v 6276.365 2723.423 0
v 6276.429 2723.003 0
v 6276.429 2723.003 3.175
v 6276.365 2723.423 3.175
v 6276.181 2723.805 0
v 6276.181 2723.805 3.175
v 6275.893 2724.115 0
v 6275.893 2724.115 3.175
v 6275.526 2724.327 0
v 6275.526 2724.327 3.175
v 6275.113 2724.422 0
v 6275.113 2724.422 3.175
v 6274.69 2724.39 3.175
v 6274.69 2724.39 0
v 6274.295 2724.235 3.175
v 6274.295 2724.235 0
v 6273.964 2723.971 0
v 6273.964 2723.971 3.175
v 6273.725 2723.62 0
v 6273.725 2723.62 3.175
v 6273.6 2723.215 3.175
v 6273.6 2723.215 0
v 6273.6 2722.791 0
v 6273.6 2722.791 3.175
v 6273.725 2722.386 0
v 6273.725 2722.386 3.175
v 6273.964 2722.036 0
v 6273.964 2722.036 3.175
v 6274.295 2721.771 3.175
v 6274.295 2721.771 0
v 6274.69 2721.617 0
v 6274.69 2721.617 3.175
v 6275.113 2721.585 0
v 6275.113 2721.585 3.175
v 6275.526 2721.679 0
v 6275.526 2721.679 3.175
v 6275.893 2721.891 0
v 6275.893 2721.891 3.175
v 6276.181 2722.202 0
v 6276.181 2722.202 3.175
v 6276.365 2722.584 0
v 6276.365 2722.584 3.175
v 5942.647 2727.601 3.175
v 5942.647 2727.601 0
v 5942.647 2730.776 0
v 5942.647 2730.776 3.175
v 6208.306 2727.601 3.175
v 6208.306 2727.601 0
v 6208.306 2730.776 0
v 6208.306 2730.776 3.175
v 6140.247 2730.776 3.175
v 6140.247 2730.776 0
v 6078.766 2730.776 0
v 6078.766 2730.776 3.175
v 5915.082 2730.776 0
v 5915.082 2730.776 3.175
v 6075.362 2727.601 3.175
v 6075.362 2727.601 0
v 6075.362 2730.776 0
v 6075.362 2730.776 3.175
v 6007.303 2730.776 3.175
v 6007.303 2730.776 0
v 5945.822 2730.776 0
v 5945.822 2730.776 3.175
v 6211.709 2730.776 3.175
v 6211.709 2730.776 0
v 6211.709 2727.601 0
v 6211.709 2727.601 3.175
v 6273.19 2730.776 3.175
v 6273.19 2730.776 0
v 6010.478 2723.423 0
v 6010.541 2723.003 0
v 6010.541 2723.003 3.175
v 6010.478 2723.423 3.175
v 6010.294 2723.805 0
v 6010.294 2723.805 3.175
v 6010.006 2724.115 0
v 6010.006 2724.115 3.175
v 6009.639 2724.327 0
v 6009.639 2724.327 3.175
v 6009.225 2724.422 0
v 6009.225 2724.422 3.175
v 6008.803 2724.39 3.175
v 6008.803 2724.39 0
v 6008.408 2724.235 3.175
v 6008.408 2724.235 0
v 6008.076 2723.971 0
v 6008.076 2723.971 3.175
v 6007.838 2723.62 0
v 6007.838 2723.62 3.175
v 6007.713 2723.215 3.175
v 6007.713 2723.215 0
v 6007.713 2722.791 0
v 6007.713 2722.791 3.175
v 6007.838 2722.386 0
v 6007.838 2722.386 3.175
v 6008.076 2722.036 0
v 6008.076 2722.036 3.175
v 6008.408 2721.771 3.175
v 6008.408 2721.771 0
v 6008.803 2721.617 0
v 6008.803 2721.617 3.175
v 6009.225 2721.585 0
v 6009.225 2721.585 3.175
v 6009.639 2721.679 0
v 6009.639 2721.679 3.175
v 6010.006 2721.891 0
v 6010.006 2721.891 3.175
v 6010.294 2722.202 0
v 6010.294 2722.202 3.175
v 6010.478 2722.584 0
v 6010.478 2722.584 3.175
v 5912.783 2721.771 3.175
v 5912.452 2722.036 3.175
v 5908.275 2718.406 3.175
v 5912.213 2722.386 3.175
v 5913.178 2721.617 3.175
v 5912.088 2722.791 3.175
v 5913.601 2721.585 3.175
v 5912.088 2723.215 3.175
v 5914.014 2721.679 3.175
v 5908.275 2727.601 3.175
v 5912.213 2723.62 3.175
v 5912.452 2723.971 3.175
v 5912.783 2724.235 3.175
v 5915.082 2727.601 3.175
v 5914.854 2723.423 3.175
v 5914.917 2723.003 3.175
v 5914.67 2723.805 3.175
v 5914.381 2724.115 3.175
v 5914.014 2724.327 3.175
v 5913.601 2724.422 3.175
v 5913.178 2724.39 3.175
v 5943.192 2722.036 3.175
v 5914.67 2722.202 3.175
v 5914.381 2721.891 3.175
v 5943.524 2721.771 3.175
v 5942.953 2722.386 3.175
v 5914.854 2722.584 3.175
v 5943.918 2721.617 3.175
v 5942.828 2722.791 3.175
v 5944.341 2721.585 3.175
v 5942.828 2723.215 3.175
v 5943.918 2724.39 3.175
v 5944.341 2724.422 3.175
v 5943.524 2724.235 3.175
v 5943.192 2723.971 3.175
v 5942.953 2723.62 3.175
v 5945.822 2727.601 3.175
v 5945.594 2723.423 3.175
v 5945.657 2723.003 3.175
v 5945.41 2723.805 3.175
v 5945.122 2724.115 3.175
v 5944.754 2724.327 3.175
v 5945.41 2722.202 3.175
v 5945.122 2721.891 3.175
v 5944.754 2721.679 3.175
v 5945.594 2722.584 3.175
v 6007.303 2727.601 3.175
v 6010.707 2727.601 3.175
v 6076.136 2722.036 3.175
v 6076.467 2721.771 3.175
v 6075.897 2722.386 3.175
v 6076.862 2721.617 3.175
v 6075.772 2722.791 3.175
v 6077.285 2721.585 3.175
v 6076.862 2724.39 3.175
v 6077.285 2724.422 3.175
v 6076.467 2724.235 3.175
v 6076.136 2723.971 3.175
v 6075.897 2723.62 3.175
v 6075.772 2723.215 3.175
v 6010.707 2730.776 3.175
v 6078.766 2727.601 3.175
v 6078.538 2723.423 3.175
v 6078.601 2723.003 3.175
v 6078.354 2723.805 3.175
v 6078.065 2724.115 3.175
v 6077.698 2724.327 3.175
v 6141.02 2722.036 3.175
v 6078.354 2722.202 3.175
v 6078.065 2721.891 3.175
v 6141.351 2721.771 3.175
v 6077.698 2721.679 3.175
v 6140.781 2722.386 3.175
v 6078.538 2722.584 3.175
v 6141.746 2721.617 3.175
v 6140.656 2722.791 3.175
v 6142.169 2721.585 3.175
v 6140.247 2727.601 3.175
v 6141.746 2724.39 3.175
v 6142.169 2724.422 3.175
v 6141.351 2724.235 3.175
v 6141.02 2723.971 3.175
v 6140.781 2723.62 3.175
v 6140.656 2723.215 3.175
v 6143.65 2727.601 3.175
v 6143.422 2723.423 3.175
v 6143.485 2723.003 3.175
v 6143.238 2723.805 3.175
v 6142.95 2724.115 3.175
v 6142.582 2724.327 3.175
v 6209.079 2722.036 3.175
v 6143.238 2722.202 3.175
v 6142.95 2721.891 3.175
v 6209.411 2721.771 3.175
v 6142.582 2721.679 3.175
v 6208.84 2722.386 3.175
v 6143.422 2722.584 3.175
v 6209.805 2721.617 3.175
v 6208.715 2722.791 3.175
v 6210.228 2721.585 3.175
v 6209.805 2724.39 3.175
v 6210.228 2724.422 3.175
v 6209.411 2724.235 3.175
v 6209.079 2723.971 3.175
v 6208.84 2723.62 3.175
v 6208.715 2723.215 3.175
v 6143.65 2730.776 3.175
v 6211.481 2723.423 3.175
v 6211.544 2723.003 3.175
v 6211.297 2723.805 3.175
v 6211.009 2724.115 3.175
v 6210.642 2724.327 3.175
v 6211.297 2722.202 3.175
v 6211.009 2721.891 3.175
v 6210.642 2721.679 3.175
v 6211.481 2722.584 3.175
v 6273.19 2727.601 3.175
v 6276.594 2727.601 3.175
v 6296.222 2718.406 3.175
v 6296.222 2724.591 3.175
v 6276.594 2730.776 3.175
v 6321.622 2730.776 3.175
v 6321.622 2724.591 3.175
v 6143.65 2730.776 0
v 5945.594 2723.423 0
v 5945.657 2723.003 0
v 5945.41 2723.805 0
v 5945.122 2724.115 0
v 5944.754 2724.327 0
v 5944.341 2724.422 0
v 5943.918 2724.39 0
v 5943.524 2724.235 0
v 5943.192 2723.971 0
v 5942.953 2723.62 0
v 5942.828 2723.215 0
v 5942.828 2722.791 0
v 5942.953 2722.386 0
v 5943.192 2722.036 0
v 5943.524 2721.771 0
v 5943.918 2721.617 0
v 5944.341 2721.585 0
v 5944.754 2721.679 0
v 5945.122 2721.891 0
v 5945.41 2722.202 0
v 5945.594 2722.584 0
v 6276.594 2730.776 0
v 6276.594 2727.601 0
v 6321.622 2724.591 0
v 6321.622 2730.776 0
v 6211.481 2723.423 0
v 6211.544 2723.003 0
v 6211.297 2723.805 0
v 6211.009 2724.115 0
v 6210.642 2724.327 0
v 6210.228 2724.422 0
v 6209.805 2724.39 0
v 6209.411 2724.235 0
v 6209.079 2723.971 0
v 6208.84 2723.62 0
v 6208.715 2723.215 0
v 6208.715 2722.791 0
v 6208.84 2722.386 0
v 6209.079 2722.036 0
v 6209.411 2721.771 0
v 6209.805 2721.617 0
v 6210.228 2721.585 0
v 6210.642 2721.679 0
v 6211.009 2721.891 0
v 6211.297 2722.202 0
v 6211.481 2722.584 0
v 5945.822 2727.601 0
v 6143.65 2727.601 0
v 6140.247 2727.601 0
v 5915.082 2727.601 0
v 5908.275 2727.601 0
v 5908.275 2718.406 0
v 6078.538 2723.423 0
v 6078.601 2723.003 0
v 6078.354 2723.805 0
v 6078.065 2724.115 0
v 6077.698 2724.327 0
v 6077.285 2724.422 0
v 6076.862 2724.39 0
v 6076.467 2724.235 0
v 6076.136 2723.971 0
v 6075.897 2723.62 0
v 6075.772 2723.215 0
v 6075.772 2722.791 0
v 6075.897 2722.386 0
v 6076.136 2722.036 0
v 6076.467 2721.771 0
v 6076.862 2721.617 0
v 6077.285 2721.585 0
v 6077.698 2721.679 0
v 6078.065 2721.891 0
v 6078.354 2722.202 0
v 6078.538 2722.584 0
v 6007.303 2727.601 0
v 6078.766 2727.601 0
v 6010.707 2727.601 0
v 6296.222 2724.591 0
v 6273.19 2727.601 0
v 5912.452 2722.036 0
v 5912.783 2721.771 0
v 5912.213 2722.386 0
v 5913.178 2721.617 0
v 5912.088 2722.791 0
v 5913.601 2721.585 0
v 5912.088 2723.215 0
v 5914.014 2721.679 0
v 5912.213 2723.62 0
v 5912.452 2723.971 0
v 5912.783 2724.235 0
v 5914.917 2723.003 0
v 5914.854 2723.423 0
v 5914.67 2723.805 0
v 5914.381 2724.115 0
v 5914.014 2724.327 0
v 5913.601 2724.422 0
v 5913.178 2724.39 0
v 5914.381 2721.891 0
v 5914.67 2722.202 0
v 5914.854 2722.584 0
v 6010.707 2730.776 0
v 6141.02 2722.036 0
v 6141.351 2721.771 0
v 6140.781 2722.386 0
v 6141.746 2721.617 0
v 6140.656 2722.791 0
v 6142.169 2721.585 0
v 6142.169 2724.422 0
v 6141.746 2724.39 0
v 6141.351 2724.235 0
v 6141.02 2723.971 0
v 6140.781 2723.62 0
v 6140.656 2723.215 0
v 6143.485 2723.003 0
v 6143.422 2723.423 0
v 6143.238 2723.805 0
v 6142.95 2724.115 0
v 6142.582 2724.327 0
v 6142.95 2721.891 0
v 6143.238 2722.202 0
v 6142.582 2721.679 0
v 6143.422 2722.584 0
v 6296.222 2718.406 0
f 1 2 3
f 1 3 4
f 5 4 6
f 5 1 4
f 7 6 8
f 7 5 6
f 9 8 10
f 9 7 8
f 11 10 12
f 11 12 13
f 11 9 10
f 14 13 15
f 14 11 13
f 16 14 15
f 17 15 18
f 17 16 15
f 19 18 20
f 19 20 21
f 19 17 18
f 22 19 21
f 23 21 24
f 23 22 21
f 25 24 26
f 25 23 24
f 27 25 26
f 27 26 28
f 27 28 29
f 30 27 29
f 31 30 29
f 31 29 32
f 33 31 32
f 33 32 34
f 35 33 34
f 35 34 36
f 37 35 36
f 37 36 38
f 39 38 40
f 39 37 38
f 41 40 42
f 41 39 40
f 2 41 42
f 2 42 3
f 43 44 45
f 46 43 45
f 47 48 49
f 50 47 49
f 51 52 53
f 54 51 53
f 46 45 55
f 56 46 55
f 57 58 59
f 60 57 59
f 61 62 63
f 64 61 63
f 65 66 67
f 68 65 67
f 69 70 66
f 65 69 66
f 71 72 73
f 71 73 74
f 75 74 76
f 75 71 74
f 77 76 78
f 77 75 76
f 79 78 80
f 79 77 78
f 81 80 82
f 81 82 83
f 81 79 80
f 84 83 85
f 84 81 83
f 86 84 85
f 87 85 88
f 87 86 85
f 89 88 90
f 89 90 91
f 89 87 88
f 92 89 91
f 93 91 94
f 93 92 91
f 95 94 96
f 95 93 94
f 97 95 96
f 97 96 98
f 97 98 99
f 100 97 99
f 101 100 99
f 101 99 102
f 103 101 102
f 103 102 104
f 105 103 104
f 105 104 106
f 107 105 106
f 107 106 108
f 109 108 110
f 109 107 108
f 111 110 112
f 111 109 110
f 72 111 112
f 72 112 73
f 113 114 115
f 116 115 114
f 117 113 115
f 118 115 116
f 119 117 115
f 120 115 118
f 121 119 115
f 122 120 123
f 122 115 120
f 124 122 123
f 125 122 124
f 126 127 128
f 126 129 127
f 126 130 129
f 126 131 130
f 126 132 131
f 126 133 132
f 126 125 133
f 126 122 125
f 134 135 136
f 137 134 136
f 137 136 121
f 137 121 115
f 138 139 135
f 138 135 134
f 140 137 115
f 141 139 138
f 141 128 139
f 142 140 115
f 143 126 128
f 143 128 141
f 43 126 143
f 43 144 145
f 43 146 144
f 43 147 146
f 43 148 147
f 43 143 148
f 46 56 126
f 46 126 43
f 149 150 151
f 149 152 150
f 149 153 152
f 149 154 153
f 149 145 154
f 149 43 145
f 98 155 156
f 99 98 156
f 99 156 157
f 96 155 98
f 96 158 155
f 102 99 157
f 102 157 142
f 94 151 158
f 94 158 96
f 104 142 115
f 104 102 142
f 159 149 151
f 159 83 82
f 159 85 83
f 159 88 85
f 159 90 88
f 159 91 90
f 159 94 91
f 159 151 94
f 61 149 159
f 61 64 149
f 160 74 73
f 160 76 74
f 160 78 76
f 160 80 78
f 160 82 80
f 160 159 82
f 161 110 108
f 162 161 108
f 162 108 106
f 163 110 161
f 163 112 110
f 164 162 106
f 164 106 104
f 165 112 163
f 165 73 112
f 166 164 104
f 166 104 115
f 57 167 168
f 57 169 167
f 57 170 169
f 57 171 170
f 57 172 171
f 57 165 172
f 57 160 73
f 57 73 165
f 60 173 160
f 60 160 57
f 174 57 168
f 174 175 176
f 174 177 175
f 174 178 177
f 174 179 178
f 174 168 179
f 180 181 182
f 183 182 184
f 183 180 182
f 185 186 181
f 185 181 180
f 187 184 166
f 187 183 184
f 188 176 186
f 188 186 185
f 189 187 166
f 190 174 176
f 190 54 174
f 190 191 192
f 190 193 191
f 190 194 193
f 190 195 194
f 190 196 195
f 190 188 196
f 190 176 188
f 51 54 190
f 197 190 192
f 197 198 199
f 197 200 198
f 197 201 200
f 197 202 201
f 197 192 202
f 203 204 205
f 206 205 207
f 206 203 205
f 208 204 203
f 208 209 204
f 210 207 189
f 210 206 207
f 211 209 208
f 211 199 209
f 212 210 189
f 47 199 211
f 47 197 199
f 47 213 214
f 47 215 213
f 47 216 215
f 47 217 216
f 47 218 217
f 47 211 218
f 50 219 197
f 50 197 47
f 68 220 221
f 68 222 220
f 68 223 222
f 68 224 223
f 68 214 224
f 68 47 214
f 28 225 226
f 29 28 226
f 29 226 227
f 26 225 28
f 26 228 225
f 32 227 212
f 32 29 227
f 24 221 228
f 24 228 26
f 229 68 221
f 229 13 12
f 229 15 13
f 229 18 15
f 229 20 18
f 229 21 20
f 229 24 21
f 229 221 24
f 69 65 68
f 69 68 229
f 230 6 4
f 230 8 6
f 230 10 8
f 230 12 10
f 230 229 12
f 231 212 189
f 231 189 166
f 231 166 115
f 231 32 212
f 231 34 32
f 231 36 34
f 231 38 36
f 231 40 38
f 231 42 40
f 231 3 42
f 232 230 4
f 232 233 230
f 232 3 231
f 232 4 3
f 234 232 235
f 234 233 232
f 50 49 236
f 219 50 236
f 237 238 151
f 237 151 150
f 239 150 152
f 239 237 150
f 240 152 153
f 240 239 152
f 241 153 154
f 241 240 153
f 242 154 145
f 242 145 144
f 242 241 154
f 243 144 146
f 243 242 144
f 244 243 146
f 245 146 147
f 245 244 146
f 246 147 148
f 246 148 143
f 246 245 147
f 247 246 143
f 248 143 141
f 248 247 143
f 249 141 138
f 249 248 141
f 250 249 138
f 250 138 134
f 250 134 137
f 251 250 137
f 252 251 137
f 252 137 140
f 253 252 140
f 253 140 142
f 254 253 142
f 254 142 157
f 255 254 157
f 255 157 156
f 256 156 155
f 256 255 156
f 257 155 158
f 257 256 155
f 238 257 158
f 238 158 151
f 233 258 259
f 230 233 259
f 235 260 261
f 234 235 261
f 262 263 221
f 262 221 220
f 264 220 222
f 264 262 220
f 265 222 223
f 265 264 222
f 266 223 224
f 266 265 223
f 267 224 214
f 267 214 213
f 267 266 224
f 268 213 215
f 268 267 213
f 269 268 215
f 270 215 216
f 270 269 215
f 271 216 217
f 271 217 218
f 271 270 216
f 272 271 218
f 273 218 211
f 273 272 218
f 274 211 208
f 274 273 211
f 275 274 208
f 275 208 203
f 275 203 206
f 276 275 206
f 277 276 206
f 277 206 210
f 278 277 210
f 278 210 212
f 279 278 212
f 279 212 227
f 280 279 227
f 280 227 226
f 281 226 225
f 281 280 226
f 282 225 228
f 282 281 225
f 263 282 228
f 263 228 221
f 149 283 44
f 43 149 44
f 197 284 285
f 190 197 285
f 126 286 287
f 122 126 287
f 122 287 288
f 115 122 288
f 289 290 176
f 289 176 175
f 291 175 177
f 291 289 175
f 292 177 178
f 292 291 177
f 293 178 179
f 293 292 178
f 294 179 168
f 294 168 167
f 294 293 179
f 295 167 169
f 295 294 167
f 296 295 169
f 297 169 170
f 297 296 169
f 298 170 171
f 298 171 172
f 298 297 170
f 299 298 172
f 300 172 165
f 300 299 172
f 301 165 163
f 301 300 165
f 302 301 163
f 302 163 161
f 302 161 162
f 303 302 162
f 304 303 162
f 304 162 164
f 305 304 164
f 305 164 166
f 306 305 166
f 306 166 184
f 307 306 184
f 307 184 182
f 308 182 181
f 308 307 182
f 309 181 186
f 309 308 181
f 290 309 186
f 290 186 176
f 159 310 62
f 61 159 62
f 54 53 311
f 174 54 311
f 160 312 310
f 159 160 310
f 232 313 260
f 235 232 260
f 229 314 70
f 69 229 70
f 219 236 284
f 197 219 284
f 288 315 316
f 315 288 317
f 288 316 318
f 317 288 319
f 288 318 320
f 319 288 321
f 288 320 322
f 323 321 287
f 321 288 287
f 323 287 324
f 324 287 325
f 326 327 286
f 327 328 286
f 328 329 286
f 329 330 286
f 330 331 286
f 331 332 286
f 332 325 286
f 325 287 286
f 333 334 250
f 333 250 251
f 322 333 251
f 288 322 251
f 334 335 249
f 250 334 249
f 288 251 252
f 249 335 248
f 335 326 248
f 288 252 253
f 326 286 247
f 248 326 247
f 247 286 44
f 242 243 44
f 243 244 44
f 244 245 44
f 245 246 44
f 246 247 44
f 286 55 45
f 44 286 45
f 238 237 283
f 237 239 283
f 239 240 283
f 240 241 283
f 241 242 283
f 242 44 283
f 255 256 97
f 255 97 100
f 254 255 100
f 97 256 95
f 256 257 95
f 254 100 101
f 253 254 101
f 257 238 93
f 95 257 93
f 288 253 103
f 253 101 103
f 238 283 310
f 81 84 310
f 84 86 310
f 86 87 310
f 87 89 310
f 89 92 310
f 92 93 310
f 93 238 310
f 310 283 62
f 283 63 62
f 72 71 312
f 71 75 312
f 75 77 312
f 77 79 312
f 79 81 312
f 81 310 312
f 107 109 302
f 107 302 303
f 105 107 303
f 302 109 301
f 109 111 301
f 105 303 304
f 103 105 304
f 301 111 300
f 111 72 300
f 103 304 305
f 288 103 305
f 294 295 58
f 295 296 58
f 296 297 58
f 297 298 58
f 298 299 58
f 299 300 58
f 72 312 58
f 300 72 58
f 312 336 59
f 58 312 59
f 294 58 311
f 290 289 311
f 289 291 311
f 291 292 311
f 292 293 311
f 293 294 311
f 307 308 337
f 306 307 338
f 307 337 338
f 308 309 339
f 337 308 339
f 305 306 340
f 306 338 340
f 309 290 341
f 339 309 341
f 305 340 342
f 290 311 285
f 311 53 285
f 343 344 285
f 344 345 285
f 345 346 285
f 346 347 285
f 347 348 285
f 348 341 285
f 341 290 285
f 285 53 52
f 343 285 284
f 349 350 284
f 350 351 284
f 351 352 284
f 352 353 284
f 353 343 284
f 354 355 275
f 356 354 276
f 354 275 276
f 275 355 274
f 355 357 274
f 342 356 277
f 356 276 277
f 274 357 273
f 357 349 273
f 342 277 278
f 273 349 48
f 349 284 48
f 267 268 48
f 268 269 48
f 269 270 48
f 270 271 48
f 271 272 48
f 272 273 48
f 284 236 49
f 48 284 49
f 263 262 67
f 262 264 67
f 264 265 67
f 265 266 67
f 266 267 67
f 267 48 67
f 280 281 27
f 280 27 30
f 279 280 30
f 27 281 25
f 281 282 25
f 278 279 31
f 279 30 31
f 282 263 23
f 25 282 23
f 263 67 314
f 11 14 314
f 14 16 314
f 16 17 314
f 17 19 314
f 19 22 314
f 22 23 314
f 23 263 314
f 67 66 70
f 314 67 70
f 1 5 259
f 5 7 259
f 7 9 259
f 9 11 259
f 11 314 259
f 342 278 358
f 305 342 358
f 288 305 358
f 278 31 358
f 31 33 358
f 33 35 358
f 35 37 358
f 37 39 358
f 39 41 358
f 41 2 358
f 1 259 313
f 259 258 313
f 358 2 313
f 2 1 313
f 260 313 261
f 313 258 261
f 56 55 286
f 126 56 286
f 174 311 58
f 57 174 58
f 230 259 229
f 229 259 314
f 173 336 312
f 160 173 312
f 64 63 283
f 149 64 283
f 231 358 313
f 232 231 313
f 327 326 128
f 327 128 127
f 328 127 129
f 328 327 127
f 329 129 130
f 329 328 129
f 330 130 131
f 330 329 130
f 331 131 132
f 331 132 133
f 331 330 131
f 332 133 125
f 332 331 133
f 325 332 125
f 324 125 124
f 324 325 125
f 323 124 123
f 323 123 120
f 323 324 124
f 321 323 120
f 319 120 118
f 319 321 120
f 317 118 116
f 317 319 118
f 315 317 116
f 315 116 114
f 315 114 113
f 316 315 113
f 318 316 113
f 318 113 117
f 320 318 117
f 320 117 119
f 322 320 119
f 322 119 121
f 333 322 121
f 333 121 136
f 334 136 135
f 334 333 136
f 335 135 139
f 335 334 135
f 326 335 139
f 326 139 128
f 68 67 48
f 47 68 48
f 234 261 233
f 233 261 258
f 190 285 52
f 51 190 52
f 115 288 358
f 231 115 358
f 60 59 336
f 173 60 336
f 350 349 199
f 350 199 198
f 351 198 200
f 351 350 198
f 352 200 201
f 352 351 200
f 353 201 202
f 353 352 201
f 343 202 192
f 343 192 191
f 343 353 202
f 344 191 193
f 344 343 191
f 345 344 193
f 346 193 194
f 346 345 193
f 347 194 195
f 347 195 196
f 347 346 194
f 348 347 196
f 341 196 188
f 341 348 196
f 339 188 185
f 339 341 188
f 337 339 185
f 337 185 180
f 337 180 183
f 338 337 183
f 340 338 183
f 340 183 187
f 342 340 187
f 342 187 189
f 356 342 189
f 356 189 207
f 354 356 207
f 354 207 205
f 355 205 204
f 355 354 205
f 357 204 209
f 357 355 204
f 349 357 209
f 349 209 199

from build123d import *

# Parameters (mm, degrees)
SKETCH1_R           = 1.4224
BOSS_EXTRUDE1_DEPTH = 3.175


with BuildPart() as part:
    # Sketch1 → Boss-Extrude1 (new body)
    with BuildSketch(Plane.XY):
        Polygon((5915.081902132, 2730.775703183), (5915.081902132, 2727.600703183), (5908.274702132, 2727.600703183), (5908.274702132, 2718.405903183), (6296.221602132, 2718.405903183), (6296.221602132, 2724.590803183), (6321.621602132, 2724.590803183), (6321.621602132, 2730.775703183), (6276.593752132, 2730.775703183), (6276.593752132, 2727.600703184), (6273.190152132, 2727.600703184), (6273.190152132, 2730.775703183), (6211.709452132, 2730.775703183), (6211.709452132, 2727.600703184), (6208.305852132, 2727.600703184), (6208.305852132, 2730.775703183), (6143.650152132, 2730.775703183), (6143.650152132, 2727.600703184), (6140.246552132, 2727.600703184), (6140.246552132, 2730.775703183), (6078.765852132, 2730.775703183), (6078.765852132, 2727.600703183), (6075.362252132, 2727.600703183), (6075.362252132, 2730.775703183), (6010.706552132, 2730.775703183), (6010.706552132, 2727.600703183), (6007.302952132, 2727.600703183), (6007.302952132, 2730.775703183), (5945.822252132, 2730.775703183), (5945.822252132, 2727.600703183), (5942.647252132, 2727.600703183), (5942.647252132, 2730.775703183), align=None)
        with Locations((5944.234752132, 2723.003303183)):
            Circle(SKETCH1_R, mode=Mode.SUBTRACT)
        with Locations((6009.119052132, 2723.003303183)):
            Circle(SKETCH1_R, mode=Mode.SUBTRACT)
        with Locations((6077.178352132, 2723.003303183)):
            Circle(SKETCH1_R, mode=Mode.SUBTRACT)
        with Locations((6142.062652132, 2723.003303183)):
            Circle(SKETCH1_R, mode=Mode.SUBTRACT)
        with Locations((6210.121952132, 2723.003303183)):
            Circle(SKETCH1_R, mode=Mode.SUBTRACT)
        with Locations((6275.006252132, 2723.003303183)):
            Circle(SKETCH1_R, mode=Mode.SUBTRACT)
        with Locations((5913.494402132, 2723.003303183)):
            Circle(SKETCH1_R, mode=Mode.SUBTRACT)
    extrude(amount=BOSS_EXTRUDE1_DEPTH)


solid = part.part
